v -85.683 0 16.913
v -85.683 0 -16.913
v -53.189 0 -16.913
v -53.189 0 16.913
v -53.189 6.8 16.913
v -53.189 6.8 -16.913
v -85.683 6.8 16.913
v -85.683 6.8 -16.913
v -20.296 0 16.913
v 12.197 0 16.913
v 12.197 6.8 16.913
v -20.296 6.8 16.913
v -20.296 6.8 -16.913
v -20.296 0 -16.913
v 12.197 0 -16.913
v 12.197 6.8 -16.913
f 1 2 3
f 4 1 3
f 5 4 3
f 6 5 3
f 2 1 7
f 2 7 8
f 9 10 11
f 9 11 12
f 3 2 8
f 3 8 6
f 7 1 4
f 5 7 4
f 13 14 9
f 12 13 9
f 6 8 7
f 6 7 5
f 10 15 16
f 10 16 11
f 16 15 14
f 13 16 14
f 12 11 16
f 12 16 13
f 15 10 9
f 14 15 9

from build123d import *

# Parameters (mm, degrees)
SKIZZE1_W                       = 32.493442011
SKIZZE1_H                       = 33.825140454
AUFSATZ_LINEAR_AUSTRAGEN1_DEPTH = 6.8
KREISMUSTER1_COUNT              = 2


with BuildPart() as part:
    # Skizze1 → Aufsatz-Linear austragen1 (new body)
    with BuildSketch(Plane(origin=(0, 0, 0), x_dir=(1, 0, 0), z_dir=(0, 1, 0))):
        with Locations((-69.435959861, 0)):
            Rectangle(SKIZZE1_W, SKIZZE1_H)
    extrude(amount=AUFSATZ_LINEAR_AUSTRAGEN1_DEPTH)


with BuildPart() as kreismuster1_1:
    # Kreismuster1: pattern copy
    add(part.part.rotate(Axis((-36.7427755, 0, 0), (0, 1, 0)), 1 * 360 / KREISMUSTER1_COUNT))


solid = Compound([part.part, kreismuster1_1.part])
